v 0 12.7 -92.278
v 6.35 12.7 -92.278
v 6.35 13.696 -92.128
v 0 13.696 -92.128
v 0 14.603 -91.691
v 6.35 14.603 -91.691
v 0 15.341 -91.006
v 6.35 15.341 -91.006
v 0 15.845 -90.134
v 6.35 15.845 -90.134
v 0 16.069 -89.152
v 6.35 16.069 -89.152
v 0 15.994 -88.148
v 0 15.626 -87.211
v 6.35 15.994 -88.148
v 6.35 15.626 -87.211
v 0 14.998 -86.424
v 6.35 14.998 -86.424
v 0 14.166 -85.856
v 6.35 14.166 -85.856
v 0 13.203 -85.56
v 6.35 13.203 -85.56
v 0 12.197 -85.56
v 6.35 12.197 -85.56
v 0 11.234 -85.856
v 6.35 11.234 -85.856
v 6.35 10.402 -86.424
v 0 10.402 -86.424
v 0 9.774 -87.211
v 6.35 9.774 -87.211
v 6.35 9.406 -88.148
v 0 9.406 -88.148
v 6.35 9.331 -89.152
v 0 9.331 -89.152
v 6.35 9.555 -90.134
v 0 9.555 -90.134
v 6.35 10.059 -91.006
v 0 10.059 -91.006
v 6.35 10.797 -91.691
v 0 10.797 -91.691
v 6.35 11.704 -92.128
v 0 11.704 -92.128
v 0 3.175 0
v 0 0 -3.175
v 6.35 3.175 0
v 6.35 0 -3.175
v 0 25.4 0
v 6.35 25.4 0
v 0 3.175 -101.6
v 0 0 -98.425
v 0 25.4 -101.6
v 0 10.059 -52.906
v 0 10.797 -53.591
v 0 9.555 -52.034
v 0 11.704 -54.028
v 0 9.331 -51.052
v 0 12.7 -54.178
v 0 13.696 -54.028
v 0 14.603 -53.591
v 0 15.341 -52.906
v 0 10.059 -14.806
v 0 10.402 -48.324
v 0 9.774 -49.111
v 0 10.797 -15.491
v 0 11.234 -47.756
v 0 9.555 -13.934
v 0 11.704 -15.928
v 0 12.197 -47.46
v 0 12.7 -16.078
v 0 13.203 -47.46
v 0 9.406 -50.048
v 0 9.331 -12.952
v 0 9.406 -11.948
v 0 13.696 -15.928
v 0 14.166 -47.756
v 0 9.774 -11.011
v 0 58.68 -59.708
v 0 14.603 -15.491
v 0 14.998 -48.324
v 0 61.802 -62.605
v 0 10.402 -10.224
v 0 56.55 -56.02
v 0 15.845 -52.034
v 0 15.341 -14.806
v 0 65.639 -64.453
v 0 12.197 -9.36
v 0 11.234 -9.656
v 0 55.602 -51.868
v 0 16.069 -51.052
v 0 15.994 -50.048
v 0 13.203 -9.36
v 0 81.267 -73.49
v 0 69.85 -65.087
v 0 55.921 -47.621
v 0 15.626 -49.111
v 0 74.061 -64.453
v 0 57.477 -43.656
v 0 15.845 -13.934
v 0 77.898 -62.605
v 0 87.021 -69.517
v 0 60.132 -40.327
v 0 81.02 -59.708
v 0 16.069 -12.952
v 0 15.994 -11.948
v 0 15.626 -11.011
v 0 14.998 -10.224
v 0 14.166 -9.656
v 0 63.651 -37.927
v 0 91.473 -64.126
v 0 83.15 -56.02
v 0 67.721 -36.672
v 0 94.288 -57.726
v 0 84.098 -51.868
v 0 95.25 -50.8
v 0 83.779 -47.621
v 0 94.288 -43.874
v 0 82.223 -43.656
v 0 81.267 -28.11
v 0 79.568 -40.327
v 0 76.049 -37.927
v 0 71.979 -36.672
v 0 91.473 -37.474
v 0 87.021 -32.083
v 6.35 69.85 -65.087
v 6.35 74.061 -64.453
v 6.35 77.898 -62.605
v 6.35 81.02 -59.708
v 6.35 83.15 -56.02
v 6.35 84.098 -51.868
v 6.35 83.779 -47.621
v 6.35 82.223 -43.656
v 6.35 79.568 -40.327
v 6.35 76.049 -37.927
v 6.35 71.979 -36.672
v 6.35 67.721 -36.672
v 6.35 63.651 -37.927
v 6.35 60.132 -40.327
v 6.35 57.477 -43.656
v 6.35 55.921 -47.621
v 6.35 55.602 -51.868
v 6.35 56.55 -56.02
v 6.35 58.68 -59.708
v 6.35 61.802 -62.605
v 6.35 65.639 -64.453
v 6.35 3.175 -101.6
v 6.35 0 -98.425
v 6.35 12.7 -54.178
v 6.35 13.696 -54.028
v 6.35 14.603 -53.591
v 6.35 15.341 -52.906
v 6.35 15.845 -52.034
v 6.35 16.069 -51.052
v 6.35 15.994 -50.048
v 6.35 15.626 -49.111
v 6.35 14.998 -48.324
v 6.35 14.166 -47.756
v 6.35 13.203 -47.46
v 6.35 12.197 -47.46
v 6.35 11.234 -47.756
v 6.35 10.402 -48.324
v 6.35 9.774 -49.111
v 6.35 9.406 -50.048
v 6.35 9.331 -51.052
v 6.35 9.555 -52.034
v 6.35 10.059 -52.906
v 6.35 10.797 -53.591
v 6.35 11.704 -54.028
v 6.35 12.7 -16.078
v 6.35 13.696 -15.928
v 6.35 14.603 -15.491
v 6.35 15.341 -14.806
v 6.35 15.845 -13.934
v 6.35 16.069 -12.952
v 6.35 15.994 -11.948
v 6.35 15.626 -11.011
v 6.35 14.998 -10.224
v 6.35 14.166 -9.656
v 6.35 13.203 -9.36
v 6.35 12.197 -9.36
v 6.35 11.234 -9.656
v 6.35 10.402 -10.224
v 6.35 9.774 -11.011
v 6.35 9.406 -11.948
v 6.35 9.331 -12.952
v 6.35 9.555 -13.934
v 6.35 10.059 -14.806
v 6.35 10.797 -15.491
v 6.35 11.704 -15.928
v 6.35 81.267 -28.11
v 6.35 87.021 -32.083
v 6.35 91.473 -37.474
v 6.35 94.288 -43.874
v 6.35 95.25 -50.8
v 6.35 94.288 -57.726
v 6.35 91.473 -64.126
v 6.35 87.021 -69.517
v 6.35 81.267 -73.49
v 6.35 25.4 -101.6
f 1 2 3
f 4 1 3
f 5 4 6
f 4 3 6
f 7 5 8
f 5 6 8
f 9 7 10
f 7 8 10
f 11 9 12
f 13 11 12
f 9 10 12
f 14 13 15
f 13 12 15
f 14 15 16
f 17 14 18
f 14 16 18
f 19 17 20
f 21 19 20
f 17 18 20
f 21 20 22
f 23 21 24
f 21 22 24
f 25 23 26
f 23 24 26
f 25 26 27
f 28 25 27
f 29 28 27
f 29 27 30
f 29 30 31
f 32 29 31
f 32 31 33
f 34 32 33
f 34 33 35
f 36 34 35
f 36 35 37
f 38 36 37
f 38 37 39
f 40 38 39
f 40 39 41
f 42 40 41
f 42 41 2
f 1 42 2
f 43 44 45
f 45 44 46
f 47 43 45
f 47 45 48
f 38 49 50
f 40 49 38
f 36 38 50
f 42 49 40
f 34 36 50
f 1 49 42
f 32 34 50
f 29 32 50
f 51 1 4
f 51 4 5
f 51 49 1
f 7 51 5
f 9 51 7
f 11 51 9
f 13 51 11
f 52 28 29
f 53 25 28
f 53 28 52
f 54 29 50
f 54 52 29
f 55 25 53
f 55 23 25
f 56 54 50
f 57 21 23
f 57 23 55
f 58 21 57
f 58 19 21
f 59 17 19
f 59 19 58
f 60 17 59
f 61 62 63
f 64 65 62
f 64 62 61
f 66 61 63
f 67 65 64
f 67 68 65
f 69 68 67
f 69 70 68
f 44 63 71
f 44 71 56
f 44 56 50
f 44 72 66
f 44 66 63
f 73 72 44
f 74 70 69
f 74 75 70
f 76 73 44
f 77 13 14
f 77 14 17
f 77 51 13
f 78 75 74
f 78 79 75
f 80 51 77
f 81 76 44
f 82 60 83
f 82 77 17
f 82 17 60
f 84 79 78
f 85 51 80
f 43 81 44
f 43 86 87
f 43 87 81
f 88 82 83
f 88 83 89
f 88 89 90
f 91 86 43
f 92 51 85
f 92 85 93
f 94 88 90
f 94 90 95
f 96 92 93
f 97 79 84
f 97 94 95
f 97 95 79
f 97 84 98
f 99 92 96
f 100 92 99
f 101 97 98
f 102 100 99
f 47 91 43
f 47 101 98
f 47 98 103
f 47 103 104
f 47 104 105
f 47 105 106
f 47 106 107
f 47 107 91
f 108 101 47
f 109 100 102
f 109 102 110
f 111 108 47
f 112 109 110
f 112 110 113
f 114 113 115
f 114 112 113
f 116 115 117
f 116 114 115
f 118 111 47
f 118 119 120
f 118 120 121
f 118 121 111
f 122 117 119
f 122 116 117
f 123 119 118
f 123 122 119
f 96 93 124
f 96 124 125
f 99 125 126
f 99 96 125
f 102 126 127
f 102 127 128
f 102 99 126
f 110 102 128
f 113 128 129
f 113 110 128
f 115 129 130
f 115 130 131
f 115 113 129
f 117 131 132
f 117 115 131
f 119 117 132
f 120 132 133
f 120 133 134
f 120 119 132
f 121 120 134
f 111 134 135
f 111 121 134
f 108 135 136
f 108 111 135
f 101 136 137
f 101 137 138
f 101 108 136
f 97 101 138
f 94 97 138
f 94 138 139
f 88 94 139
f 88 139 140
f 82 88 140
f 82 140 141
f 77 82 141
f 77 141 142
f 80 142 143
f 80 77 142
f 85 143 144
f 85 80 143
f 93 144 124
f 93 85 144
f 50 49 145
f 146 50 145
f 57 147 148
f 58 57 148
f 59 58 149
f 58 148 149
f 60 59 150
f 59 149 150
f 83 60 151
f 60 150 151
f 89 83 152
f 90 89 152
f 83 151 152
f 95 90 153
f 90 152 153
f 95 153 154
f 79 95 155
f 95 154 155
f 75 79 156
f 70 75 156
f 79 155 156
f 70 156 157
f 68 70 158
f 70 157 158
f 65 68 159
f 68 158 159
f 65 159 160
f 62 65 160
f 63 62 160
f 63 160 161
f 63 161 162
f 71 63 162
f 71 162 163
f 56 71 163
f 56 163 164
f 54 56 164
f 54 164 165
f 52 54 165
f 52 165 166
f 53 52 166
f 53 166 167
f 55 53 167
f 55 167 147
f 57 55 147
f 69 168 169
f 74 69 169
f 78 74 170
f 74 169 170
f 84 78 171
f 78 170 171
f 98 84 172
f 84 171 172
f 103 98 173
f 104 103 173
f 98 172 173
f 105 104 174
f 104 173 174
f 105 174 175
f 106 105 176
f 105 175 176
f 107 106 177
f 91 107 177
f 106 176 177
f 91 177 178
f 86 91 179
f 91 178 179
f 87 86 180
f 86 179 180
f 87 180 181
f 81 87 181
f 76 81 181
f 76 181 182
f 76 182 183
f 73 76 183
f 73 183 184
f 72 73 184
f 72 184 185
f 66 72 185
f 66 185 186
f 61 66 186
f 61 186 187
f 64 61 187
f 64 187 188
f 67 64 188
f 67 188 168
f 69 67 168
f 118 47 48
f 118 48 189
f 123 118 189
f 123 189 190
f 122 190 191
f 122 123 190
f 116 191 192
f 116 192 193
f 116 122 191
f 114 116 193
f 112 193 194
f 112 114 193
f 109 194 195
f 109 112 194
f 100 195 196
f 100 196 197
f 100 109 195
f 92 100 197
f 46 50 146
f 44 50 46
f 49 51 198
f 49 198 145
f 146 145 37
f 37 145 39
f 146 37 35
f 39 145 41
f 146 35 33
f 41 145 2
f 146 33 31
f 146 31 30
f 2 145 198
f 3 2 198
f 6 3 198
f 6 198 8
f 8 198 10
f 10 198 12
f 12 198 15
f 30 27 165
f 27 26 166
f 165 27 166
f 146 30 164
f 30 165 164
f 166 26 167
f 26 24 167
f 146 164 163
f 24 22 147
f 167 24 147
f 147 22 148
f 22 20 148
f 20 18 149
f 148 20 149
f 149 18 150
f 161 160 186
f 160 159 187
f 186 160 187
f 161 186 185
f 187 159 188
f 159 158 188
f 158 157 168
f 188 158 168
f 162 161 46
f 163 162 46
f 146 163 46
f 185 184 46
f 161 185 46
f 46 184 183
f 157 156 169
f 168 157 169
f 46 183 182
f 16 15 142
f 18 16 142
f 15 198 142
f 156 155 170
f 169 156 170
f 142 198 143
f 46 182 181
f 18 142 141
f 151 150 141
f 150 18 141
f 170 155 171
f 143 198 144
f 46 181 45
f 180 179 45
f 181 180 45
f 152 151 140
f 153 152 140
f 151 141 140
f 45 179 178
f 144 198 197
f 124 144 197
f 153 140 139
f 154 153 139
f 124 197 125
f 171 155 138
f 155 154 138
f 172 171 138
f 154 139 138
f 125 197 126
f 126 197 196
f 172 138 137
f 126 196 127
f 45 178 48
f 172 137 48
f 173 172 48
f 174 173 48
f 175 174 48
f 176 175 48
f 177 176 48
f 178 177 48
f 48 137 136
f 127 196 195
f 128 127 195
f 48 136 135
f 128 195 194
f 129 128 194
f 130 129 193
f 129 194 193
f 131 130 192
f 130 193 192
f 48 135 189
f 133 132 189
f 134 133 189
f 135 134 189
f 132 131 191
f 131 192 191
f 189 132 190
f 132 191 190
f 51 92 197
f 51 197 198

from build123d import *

# Parameters (mm, degrees)
SKETCH1_R           = 14.2875
BOSS_EXTRUDE1_DEPTH = 6.35
SKETCH2_R           = 3.3782
CUT_EXTRUDE1_DEPTH  = 7.35
CHAMFER1_SIZE       = 3.175


with BuildPart() as part:
    # Sketch1 → Boss-Extrude1 (new body)
    with BuildSketch(Plane(origin=(0, 0, 0), x_dir=(0, 0, -1), z_dir=(1, 0, 0))):
        with BuildLine():
            Line((0, 0), (0, 25.4))
            Line((0, 25.4), (28.110381264, 81.266707127))
            ThreePointArc((28.110381264, 81.266707127), (50.8, 95.25), (73.489618736, 81.266707127))
            Line((73.489618736, 81.266707127), (101.6, 25.4))
            Line((101.6, 25.4), (101.6, 0))
            Line((101.6, 0), (0, 0))
        make_face()
        with Locations((50.8, 69.85)):
            Circle(SKETCH1_R, mode=Mode.SUBTRACT)
    extrude(amount=BOSS_EXTRUDE1_DEPTH)

    # Sketch2 → Cut-Extrude1 (cut, through all)
    with BuildSketch(Plane(origin=(6.35, 0, 0), x_dir=(0, 0, -1), z_dir=(1, 0, 0))):
        with Locations((12.7, 12.7)):
            Circle(SKETCH2_R)
        with Locations((50.8, 12.7)):
            Circle(SKETCH2_R)
        with Locations((88.9, 12.7)):
            Circle(SKETCH2_R)
    extrude(amount=-CUT_EXTRUDE1_DEPTH, mode=Mode.SUBTRACT)

    # Chamfer1
    chamfer1_edges = [part.edges().sort_by_distance(p)[0] for p in [
        (3.175, 0, 0),
        (3.175, 0, -101.6),
    ]]
    chamfer(chamfer1_edges, length=CHAMFER1_SIZE)


solid = part.part
